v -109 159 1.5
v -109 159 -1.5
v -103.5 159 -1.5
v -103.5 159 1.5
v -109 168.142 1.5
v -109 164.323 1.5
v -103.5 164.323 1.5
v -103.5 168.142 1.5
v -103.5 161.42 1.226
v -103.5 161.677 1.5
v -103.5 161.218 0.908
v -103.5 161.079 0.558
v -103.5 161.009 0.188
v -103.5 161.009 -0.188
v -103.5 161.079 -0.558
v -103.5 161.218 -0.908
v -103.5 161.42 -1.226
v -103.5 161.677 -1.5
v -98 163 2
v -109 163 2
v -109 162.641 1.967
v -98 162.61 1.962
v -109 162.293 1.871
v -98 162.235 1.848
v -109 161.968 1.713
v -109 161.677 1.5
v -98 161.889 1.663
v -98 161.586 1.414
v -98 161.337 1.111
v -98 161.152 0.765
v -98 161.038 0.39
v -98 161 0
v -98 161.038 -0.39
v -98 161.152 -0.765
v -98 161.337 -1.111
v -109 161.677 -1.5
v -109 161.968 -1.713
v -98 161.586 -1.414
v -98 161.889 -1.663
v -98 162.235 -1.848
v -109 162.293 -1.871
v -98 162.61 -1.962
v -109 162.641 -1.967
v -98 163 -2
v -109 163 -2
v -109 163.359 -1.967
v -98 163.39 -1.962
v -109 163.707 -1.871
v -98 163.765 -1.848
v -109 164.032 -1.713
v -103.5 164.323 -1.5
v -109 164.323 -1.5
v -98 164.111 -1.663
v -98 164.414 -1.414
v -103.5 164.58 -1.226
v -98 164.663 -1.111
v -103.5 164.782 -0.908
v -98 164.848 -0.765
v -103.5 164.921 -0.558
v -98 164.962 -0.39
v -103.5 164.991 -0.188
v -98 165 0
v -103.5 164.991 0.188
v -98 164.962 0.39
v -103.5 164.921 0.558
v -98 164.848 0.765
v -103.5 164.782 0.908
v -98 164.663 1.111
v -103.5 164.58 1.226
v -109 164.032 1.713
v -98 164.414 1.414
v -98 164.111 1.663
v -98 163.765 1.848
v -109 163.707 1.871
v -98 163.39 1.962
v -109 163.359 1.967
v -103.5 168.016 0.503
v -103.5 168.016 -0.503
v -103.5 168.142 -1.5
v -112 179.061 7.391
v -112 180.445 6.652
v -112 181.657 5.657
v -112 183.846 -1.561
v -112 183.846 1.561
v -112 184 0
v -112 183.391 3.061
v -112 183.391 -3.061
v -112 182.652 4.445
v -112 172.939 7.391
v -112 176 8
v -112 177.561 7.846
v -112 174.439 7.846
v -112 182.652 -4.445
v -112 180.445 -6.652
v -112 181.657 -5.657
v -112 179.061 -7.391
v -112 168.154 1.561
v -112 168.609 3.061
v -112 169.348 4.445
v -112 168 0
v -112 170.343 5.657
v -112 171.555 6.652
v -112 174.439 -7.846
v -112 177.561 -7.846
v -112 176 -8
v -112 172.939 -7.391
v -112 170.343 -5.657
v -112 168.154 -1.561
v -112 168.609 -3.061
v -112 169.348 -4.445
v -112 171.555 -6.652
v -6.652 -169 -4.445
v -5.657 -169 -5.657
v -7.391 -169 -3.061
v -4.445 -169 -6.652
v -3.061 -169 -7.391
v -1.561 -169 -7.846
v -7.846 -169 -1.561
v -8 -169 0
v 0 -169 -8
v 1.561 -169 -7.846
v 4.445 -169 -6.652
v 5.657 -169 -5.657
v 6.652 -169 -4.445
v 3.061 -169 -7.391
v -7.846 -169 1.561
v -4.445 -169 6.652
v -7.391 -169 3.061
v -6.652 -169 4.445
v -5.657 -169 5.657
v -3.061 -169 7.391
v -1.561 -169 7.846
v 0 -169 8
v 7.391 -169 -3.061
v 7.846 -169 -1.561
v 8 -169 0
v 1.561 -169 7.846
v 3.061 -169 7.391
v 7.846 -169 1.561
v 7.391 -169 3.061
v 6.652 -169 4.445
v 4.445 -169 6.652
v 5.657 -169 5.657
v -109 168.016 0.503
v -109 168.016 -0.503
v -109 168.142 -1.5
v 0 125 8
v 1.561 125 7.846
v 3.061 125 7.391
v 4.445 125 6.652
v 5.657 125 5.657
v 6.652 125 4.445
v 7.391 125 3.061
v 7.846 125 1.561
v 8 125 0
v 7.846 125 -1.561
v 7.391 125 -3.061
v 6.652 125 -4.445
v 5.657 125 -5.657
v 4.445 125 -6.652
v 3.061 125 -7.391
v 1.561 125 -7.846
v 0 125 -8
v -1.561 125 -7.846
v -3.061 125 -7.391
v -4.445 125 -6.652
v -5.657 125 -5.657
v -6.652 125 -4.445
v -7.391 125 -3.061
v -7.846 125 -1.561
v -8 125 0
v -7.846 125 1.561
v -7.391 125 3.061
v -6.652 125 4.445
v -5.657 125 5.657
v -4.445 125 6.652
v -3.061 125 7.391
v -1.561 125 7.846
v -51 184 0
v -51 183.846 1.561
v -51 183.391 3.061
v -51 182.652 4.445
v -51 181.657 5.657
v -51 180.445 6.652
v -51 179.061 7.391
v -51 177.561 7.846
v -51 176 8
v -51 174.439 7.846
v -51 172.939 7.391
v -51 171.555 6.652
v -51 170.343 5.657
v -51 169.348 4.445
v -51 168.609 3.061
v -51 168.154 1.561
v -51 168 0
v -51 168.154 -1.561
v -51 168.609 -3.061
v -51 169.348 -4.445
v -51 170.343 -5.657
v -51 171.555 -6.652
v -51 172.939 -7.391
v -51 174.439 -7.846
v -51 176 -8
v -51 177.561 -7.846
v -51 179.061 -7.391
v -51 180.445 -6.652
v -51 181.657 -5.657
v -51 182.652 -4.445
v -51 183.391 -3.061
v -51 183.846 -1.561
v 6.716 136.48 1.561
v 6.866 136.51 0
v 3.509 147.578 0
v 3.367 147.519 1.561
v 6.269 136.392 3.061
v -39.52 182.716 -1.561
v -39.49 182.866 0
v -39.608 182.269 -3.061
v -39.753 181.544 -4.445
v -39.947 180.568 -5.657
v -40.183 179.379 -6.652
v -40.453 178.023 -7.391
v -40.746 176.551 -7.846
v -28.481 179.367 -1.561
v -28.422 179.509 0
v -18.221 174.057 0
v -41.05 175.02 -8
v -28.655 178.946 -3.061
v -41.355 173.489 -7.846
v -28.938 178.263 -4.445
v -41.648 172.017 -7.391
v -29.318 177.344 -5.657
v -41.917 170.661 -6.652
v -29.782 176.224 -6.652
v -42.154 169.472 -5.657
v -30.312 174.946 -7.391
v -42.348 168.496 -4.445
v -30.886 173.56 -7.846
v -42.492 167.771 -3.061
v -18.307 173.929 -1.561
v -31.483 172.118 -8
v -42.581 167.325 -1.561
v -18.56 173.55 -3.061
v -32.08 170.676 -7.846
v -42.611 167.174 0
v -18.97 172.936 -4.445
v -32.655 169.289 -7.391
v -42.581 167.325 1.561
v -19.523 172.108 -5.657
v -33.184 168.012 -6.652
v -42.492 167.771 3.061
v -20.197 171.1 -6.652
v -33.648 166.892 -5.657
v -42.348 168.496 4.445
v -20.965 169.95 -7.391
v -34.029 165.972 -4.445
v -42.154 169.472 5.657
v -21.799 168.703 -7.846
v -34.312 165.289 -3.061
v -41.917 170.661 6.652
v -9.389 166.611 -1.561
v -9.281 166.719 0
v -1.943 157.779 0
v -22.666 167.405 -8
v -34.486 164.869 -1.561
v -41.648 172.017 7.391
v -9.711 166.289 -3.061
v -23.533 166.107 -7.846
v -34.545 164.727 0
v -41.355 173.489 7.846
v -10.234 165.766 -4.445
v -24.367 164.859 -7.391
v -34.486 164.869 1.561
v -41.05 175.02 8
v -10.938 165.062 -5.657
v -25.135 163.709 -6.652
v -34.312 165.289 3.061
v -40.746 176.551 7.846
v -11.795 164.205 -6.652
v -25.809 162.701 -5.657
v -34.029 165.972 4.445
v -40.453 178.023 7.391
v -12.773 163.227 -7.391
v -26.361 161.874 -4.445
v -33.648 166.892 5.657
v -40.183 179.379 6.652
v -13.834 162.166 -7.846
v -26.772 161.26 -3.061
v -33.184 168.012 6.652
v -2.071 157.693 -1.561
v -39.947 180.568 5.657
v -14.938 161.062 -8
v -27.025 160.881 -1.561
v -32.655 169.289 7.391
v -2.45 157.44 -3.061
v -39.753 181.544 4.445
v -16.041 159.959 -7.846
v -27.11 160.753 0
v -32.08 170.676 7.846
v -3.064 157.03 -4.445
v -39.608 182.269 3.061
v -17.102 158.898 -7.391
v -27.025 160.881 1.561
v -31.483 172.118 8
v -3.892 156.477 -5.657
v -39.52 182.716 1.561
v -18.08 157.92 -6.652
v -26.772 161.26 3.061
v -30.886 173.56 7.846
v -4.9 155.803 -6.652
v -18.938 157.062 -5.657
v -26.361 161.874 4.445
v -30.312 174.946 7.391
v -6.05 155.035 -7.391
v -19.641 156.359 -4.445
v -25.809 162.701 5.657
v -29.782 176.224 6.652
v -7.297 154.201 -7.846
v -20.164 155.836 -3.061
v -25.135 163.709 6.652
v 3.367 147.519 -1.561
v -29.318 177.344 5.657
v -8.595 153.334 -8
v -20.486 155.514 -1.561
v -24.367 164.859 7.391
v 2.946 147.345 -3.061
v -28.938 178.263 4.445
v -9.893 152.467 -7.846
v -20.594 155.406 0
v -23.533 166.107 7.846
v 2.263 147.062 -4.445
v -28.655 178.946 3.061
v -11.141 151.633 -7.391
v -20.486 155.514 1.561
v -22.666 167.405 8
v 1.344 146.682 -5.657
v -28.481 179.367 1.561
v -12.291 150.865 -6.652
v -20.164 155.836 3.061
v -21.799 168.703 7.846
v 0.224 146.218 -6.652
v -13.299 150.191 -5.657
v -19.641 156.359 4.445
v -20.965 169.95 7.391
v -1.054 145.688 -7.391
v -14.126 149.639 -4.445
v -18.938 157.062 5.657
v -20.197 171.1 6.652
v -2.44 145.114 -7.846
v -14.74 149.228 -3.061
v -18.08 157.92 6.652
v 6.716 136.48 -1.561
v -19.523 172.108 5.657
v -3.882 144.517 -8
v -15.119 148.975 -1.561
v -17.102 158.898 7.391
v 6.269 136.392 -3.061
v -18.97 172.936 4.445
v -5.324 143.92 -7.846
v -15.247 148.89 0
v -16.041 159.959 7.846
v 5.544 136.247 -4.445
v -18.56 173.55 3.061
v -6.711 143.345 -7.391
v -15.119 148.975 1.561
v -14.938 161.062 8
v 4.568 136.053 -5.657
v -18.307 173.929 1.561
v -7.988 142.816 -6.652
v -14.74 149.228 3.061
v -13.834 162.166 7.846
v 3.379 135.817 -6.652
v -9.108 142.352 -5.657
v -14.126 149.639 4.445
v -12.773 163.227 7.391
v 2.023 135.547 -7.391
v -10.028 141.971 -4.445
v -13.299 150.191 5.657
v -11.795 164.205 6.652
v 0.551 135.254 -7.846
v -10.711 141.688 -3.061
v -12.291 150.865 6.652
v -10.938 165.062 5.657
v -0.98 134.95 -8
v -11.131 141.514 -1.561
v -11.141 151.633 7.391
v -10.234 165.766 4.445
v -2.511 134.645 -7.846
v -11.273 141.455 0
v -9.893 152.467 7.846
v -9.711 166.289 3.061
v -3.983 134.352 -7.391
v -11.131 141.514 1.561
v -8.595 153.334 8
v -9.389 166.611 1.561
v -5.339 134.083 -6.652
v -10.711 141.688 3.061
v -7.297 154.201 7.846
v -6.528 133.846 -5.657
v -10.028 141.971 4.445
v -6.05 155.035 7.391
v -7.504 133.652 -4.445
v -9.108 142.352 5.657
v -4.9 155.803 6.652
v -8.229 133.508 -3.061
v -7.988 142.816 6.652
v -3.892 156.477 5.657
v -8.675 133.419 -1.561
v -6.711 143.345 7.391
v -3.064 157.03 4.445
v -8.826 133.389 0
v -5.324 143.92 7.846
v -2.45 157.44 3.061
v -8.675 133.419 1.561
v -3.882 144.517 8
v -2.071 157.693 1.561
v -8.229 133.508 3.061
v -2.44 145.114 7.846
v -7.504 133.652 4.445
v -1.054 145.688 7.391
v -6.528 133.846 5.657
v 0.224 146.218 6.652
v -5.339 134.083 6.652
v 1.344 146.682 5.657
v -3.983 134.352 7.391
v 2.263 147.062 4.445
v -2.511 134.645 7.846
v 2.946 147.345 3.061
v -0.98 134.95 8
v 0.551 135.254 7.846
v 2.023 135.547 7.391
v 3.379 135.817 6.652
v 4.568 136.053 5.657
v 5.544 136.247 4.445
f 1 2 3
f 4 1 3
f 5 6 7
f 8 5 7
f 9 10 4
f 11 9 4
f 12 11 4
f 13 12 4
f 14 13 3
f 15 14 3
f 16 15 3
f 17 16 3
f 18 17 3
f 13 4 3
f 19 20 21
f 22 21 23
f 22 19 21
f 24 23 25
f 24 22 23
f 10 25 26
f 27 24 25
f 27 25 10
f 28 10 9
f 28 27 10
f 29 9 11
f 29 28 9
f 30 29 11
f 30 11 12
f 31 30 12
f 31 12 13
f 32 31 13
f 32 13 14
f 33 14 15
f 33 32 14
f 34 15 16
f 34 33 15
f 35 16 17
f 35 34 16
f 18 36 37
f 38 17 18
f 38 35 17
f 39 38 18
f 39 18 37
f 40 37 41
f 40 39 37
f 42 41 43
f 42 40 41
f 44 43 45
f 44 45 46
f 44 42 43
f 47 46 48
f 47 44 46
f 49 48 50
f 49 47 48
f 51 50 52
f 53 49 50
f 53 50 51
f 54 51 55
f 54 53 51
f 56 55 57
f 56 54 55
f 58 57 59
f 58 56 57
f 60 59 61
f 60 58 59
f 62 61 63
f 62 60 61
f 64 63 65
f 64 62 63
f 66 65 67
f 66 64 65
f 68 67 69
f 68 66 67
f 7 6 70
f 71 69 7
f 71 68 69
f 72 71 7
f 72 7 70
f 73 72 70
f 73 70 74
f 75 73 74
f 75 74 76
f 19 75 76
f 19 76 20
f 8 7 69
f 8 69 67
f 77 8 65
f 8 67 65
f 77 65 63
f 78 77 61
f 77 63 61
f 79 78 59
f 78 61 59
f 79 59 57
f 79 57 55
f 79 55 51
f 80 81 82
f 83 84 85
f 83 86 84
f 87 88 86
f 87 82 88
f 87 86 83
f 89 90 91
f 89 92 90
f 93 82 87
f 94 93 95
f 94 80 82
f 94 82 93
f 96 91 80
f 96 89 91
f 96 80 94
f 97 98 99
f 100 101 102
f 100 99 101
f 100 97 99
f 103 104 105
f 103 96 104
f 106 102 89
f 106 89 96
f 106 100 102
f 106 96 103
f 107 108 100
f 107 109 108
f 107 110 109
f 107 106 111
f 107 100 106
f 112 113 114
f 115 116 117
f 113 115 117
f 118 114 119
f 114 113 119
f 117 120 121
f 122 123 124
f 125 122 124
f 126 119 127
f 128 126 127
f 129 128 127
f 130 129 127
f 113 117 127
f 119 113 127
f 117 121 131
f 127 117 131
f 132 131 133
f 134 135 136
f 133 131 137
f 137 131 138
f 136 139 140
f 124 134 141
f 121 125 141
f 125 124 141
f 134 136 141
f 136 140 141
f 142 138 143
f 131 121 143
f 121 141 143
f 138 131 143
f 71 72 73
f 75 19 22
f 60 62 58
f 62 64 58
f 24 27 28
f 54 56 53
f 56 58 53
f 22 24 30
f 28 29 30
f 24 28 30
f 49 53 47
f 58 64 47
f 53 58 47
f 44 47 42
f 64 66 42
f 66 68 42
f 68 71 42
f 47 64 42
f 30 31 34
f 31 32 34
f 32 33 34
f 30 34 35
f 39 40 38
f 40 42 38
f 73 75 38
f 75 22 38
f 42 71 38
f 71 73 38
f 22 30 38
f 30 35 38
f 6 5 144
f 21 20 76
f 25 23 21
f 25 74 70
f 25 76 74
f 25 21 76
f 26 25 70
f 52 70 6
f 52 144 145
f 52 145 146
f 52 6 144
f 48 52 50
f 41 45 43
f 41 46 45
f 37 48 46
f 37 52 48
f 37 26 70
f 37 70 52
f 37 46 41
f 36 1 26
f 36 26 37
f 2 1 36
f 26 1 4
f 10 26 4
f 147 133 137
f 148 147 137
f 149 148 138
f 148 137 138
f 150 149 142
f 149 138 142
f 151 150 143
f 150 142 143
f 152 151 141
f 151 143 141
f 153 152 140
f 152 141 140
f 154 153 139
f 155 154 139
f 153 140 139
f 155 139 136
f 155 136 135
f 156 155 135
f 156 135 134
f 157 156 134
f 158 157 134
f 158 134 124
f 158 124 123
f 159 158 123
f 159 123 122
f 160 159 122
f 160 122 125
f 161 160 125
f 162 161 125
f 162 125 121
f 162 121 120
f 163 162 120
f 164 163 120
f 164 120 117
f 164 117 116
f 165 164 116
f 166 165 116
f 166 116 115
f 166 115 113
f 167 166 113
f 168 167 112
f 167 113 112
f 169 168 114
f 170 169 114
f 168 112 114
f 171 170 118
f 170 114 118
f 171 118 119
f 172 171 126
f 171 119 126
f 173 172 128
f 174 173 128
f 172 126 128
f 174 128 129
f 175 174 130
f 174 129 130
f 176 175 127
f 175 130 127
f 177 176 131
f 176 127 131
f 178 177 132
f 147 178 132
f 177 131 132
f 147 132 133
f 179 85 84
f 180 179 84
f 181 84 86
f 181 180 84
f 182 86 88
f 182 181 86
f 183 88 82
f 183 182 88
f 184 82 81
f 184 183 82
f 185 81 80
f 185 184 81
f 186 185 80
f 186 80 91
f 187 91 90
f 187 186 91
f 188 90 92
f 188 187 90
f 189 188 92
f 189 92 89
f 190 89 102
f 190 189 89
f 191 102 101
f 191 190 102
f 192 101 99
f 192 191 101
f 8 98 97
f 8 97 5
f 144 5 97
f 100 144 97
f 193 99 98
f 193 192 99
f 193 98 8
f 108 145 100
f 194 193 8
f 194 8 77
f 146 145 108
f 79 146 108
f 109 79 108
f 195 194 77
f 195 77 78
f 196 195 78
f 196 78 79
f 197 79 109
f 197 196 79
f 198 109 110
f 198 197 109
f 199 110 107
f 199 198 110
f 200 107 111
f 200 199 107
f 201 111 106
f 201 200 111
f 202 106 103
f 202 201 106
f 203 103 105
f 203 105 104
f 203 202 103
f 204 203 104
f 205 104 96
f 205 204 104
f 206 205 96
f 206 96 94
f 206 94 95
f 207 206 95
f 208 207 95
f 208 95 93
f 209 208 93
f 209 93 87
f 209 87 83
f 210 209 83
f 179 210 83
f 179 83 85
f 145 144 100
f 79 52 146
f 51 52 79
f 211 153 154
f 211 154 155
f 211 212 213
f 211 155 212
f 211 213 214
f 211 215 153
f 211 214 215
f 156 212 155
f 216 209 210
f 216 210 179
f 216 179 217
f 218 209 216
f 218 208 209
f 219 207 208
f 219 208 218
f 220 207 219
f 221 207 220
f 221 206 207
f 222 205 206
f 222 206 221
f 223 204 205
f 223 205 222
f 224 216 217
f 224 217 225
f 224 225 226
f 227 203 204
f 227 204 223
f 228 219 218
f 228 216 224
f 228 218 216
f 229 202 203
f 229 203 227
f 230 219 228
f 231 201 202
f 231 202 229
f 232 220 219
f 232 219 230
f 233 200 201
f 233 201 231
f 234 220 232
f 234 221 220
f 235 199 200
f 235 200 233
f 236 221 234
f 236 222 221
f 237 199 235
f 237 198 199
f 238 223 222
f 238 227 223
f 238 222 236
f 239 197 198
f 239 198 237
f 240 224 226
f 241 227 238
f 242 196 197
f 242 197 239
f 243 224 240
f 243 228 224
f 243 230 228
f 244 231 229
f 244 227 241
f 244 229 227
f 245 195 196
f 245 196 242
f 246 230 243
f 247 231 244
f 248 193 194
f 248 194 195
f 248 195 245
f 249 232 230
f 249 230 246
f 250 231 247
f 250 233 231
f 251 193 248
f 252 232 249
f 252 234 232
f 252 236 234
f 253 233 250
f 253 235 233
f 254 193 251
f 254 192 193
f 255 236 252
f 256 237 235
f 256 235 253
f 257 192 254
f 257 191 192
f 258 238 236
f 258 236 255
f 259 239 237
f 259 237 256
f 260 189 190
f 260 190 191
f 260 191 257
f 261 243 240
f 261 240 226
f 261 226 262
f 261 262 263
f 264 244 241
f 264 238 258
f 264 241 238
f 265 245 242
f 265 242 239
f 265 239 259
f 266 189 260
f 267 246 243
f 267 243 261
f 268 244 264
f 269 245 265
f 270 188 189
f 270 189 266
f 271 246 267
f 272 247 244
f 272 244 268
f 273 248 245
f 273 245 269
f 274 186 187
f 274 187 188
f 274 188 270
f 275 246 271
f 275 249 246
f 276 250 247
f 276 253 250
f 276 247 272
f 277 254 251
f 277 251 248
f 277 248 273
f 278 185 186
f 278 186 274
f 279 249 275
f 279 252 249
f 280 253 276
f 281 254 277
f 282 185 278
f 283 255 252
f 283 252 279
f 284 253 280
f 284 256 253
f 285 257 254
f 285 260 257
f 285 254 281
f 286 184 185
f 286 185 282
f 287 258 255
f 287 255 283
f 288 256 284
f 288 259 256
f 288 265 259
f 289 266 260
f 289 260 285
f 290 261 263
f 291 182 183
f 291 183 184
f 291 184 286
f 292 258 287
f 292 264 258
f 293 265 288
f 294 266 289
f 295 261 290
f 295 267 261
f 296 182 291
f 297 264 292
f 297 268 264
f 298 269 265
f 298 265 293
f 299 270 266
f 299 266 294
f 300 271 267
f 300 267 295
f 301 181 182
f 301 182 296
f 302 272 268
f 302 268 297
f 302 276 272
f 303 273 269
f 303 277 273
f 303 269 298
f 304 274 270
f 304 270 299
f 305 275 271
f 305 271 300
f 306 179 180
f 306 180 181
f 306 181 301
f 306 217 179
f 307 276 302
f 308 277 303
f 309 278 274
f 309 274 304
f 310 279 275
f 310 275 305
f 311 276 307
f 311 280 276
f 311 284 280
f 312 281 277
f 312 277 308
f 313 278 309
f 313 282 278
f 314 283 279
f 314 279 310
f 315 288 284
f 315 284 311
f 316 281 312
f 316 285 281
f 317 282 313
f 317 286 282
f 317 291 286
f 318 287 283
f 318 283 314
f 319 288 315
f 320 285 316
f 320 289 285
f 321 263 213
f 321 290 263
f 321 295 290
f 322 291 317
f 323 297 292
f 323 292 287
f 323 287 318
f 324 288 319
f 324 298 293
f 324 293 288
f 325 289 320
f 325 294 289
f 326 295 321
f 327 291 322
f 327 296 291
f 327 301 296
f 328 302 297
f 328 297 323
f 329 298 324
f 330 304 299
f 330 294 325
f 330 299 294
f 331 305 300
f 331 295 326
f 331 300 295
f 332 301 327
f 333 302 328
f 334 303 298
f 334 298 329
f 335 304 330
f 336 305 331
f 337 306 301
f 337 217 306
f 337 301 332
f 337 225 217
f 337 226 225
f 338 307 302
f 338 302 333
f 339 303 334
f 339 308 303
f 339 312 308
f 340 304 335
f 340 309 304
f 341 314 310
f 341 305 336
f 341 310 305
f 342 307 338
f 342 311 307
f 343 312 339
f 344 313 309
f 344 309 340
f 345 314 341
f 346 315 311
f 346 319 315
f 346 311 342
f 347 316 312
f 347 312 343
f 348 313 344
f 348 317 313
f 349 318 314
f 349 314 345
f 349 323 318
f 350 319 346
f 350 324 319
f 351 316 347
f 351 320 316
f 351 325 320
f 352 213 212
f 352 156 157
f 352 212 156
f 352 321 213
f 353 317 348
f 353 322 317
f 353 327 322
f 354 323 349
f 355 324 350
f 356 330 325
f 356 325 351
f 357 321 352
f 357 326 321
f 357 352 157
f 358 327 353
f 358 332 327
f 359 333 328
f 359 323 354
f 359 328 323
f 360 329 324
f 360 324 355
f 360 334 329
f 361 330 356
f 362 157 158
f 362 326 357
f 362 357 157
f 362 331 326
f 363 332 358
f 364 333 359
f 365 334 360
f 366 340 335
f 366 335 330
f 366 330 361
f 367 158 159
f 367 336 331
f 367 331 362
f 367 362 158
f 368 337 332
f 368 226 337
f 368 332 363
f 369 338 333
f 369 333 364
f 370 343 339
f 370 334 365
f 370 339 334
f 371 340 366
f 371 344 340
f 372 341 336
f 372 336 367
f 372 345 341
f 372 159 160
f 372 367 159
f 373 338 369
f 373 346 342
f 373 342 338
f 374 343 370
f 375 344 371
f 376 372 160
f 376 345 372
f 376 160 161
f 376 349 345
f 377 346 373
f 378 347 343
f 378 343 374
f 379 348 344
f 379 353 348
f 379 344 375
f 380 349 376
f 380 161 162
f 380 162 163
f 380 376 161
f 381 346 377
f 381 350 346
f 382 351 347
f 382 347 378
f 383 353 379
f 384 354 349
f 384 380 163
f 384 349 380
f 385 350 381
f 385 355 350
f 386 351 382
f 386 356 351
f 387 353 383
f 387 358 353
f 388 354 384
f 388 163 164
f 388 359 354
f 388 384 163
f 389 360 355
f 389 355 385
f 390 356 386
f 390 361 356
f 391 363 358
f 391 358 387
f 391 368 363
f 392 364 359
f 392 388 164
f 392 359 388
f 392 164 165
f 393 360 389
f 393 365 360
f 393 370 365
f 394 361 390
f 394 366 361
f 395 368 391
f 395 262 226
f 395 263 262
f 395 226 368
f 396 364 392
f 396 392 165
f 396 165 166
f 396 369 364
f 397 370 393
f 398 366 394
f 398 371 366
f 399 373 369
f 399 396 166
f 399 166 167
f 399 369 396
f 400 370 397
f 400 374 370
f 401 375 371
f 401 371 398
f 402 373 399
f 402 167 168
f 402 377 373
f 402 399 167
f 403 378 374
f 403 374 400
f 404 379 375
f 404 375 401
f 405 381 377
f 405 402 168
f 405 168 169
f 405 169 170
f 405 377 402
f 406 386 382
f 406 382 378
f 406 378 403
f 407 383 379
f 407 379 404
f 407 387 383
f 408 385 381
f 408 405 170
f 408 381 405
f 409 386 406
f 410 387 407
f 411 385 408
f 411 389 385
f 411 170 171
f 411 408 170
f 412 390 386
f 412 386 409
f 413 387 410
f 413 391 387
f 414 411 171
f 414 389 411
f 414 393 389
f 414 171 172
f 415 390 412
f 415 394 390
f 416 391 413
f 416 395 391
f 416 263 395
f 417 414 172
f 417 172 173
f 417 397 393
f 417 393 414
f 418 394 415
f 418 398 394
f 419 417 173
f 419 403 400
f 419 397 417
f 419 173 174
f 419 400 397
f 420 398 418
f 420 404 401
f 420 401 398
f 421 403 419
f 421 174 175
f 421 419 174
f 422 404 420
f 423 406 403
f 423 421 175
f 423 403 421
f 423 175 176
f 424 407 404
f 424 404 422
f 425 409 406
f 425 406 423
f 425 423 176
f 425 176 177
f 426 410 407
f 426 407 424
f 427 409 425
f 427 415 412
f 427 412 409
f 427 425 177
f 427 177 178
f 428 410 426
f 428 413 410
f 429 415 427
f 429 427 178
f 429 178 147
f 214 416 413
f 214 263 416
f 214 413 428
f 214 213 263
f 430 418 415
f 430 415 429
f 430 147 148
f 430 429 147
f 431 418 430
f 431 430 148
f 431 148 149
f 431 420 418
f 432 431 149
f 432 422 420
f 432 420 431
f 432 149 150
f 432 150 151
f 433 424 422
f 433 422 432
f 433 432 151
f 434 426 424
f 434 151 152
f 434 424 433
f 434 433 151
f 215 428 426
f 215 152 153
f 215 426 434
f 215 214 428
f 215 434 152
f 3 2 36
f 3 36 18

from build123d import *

# Parameters (mm, degrees)
BOSS_EXTRUDE1_START = -169
SKETCH1_R           = 8
BOSS_EXTRUDE1_DEPTH = 294
SKETCH3_R           = 8
BOSS_EXTRUDE2_START = 159
SKETCH4_W           = 5.5
SKETCH4_H           = 3
BOSS_EXTRUDE2_DEPTH = 13
SKETCH5_W           = 11
SKETCH5_H           = 2


with BuildPart() as part:
    # Sketch1 → Boss-Extrude1 (new body)
    with BuildSketch(Plane(origin=(0, 0, 0), x_dir=(1, 0, 0), z_dir=(0, 1, 0)).offset(BOSS_EXTRUDE1_START)):
        with Locations(Location((0, 0, 0), (0, 0, 270))):
            Circle(SKETCH1_R)
    extrude(amount=BOSS_EXTRUDE1_DEPTH)

    # Sweep1: sweep along a path in Sketch2
    with BuildLine(Plane.XY) as sweep1_path:
        Line((-112, 176), (-51, 176))
        ThreePointArc((-51, 176), (-14.937554159, 161.062445841), (0, 125))
    # Sketch3 → Sweep1 (sweep)
    with BuildSketch(Plane(origin=(0, 125, 0), x_dir=(1, 0, 0), z_dir=(0, 1, 0))):
        Circle(SKETCH3_R)
    sweep(path=sweep1_path.line)

    # Sketch4 → Boss-Extrude2 (add)
    with BuildSketch(Plane(origin=(0, 0, 0), x_dir=(1, 0, 0), z_dir=(0, 1, 0)).offset(BOSS_EXTRUDE2_START)):
        with Locations((-106.25, 0)):
            Rectangle(SKETCH4_W, SKETCH4_H)
    extrude(amount=BOSS_EXTRUDE2_DEPTH)

    # Sketch5 → Revolve1 (revolve)
    with BuildSketch(Plane.XY, mode=Mode.PRIVATE) as revolve1_sk:
        with Locations((-103.5, 164)):
            Rectangle(SKETCH5_W, SKETCH5_H)
    revolve(revolve1_sk.sketch.rotate(Axis((-109, 163, 0), (1, 0, 0)), 90), axis=Axis((-109, 163, 0), (1, 0, 0)))


solid = part.part
